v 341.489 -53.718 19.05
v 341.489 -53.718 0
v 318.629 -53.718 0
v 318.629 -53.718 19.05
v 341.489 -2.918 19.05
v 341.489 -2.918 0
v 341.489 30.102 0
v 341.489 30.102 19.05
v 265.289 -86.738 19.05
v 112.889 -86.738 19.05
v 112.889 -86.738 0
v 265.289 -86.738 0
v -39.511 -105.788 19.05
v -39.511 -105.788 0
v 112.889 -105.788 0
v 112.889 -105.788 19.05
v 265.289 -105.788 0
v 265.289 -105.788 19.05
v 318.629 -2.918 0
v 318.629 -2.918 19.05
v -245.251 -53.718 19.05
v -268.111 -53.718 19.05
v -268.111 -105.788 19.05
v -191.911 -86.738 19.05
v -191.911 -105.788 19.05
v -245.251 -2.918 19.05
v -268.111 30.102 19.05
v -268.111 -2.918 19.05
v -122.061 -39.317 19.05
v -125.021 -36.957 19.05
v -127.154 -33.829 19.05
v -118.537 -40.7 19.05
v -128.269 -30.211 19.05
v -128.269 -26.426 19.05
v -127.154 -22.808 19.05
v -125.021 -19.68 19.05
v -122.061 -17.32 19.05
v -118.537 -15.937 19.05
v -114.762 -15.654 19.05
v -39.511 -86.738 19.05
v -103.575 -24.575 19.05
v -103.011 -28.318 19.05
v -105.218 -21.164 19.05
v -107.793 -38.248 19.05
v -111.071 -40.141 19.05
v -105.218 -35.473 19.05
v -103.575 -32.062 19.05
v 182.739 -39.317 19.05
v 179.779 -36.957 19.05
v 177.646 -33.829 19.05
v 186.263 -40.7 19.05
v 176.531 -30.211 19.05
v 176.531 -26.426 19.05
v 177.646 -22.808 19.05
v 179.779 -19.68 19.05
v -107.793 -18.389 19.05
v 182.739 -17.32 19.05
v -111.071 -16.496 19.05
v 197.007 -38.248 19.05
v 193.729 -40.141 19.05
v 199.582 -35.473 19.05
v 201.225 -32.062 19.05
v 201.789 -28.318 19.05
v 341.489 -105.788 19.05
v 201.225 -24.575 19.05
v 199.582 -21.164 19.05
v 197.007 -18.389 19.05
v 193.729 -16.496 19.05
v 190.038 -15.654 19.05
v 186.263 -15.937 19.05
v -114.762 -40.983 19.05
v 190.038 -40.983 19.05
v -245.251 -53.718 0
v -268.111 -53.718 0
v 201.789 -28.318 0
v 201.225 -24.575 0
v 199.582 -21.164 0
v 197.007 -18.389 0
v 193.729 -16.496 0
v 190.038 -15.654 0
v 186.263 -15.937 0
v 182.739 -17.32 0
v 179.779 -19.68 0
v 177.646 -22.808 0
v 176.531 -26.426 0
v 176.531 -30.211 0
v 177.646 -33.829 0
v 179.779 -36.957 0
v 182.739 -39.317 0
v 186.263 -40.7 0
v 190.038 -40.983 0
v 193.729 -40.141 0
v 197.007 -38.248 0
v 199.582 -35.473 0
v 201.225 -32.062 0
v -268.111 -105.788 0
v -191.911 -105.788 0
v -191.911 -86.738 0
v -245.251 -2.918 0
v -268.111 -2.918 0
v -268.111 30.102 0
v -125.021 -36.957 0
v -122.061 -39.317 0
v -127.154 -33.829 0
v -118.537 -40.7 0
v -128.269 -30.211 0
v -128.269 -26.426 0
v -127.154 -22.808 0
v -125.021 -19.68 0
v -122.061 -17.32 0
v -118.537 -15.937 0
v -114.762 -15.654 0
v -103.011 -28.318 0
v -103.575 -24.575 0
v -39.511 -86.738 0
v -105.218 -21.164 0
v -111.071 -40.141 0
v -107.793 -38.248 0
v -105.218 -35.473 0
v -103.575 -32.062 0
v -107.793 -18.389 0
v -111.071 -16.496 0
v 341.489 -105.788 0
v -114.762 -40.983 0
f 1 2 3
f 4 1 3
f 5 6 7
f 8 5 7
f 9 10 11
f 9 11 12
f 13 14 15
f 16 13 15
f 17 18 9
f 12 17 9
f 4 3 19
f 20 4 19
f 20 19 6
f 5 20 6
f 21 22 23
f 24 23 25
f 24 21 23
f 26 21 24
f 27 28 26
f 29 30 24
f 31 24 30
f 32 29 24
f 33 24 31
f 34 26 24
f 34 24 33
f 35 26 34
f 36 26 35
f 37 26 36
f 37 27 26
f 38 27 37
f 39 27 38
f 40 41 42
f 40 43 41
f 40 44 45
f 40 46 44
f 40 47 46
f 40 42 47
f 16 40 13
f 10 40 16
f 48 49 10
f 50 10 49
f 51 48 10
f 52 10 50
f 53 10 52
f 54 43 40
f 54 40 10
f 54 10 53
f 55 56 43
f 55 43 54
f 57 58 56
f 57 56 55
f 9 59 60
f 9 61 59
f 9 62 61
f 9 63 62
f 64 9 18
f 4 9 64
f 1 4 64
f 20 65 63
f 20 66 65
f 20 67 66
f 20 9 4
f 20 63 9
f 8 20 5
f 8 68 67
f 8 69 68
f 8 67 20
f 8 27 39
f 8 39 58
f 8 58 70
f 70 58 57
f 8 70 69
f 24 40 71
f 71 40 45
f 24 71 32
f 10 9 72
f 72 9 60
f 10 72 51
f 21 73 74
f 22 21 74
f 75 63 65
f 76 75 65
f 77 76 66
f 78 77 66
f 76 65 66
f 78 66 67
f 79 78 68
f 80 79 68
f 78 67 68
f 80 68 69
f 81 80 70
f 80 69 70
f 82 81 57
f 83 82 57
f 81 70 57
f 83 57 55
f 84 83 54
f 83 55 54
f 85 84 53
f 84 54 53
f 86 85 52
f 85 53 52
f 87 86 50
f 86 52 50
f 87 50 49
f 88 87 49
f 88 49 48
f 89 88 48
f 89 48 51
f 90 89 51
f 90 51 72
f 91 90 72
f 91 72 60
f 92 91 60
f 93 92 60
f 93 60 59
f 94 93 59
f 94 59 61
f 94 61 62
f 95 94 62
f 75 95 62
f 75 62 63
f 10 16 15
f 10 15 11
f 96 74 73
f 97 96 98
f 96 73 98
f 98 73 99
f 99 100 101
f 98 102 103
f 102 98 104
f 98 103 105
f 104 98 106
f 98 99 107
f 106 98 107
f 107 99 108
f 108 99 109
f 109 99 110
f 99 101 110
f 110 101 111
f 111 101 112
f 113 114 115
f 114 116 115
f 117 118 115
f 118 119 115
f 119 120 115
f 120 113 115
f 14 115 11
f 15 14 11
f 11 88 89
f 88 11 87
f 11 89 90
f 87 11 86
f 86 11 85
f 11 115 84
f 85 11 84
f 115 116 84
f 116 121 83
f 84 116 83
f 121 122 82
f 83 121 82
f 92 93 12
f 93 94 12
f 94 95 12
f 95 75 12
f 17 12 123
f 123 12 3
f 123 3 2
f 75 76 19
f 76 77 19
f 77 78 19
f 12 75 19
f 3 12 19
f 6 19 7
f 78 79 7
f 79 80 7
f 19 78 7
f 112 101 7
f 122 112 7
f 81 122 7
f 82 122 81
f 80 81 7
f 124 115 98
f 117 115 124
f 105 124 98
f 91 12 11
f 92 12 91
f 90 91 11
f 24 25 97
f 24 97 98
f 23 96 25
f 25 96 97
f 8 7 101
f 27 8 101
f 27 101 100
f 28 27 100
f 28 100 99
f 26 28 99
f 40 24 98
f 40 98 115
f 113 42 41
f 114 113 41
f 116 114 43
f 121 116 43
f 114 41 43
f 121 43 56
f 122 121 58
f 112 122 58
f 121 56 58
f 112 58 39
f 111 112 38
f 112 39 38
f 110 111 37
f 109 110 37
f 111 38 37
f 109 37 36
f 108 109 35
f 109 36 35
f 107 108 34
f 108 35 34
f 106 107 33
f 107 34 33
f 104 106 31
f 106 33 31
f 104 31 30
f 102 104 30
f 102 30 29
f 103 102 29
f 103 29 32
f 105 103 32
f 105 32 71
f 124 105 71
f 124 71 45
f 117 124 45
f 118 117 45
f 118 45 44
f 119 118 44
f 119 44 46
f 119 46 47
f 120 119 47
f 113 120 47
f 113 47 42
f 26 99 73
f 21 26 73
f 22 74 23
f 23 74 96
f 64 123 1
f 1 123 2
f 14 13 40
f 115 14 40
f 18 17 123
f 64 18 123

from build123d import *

# Parameters (mm, degrees)
F1_DEPTH = 19.05
F2_W     = 152.4
F2_H     = 19.05
F3_DEPTH = 19.051
F4_R     = 12.7
F5_DEPTH = 19.051


with BuildPart() as f1:
    # F0 (on Top) → F1 (new body)
    with BuildSketch(Plane.XY):
        Polygon((341.488764, -53.718452), (318.628764, -53.718452), (318.628764, -2.918452), (341.488764, -2.918452), (341.488764, 30.101548), (-268.111236, 30.101548), (-268.111236, -2.918452), (-245.251236, -2.918452), (-245.251236, -53.718452), (-268.111236, -53.718452), (-268.111236, -86.738452), (-268.111236, -105.788452), (341.488764, -105.788452), (341.488764, -86.738452), align=None)
    extrude(amount=F1_DEPTH)

    # F2 (on face) → F3 (cut, through all)
    with BuildSketch(Plane.XY.offset(19.05)):
        with Locations((-115.711236, -96.263452)):
            Rectangle(F2_W, F2_H)
        with Locations((189.088764, -96.263452)):
            Rectangle(F2_W, F2_H)
    extrude(amount=-F3_DEPTH, mode=Mode.SUBTRACT)

    # F4 (on face) → F5 (cut, through all)
    with BuildSketch(Plane.XY.offset(19.05)):
        with Locations((189.088764, -28.318452)):
            Circle(F4_R)
        with Locations((-115.711236, -28.318452)):
            Circle(F4_R)
    extrude(amount=-F5_DEPTH, mode=Mode.SUBTRACT)


solid = f1.part
